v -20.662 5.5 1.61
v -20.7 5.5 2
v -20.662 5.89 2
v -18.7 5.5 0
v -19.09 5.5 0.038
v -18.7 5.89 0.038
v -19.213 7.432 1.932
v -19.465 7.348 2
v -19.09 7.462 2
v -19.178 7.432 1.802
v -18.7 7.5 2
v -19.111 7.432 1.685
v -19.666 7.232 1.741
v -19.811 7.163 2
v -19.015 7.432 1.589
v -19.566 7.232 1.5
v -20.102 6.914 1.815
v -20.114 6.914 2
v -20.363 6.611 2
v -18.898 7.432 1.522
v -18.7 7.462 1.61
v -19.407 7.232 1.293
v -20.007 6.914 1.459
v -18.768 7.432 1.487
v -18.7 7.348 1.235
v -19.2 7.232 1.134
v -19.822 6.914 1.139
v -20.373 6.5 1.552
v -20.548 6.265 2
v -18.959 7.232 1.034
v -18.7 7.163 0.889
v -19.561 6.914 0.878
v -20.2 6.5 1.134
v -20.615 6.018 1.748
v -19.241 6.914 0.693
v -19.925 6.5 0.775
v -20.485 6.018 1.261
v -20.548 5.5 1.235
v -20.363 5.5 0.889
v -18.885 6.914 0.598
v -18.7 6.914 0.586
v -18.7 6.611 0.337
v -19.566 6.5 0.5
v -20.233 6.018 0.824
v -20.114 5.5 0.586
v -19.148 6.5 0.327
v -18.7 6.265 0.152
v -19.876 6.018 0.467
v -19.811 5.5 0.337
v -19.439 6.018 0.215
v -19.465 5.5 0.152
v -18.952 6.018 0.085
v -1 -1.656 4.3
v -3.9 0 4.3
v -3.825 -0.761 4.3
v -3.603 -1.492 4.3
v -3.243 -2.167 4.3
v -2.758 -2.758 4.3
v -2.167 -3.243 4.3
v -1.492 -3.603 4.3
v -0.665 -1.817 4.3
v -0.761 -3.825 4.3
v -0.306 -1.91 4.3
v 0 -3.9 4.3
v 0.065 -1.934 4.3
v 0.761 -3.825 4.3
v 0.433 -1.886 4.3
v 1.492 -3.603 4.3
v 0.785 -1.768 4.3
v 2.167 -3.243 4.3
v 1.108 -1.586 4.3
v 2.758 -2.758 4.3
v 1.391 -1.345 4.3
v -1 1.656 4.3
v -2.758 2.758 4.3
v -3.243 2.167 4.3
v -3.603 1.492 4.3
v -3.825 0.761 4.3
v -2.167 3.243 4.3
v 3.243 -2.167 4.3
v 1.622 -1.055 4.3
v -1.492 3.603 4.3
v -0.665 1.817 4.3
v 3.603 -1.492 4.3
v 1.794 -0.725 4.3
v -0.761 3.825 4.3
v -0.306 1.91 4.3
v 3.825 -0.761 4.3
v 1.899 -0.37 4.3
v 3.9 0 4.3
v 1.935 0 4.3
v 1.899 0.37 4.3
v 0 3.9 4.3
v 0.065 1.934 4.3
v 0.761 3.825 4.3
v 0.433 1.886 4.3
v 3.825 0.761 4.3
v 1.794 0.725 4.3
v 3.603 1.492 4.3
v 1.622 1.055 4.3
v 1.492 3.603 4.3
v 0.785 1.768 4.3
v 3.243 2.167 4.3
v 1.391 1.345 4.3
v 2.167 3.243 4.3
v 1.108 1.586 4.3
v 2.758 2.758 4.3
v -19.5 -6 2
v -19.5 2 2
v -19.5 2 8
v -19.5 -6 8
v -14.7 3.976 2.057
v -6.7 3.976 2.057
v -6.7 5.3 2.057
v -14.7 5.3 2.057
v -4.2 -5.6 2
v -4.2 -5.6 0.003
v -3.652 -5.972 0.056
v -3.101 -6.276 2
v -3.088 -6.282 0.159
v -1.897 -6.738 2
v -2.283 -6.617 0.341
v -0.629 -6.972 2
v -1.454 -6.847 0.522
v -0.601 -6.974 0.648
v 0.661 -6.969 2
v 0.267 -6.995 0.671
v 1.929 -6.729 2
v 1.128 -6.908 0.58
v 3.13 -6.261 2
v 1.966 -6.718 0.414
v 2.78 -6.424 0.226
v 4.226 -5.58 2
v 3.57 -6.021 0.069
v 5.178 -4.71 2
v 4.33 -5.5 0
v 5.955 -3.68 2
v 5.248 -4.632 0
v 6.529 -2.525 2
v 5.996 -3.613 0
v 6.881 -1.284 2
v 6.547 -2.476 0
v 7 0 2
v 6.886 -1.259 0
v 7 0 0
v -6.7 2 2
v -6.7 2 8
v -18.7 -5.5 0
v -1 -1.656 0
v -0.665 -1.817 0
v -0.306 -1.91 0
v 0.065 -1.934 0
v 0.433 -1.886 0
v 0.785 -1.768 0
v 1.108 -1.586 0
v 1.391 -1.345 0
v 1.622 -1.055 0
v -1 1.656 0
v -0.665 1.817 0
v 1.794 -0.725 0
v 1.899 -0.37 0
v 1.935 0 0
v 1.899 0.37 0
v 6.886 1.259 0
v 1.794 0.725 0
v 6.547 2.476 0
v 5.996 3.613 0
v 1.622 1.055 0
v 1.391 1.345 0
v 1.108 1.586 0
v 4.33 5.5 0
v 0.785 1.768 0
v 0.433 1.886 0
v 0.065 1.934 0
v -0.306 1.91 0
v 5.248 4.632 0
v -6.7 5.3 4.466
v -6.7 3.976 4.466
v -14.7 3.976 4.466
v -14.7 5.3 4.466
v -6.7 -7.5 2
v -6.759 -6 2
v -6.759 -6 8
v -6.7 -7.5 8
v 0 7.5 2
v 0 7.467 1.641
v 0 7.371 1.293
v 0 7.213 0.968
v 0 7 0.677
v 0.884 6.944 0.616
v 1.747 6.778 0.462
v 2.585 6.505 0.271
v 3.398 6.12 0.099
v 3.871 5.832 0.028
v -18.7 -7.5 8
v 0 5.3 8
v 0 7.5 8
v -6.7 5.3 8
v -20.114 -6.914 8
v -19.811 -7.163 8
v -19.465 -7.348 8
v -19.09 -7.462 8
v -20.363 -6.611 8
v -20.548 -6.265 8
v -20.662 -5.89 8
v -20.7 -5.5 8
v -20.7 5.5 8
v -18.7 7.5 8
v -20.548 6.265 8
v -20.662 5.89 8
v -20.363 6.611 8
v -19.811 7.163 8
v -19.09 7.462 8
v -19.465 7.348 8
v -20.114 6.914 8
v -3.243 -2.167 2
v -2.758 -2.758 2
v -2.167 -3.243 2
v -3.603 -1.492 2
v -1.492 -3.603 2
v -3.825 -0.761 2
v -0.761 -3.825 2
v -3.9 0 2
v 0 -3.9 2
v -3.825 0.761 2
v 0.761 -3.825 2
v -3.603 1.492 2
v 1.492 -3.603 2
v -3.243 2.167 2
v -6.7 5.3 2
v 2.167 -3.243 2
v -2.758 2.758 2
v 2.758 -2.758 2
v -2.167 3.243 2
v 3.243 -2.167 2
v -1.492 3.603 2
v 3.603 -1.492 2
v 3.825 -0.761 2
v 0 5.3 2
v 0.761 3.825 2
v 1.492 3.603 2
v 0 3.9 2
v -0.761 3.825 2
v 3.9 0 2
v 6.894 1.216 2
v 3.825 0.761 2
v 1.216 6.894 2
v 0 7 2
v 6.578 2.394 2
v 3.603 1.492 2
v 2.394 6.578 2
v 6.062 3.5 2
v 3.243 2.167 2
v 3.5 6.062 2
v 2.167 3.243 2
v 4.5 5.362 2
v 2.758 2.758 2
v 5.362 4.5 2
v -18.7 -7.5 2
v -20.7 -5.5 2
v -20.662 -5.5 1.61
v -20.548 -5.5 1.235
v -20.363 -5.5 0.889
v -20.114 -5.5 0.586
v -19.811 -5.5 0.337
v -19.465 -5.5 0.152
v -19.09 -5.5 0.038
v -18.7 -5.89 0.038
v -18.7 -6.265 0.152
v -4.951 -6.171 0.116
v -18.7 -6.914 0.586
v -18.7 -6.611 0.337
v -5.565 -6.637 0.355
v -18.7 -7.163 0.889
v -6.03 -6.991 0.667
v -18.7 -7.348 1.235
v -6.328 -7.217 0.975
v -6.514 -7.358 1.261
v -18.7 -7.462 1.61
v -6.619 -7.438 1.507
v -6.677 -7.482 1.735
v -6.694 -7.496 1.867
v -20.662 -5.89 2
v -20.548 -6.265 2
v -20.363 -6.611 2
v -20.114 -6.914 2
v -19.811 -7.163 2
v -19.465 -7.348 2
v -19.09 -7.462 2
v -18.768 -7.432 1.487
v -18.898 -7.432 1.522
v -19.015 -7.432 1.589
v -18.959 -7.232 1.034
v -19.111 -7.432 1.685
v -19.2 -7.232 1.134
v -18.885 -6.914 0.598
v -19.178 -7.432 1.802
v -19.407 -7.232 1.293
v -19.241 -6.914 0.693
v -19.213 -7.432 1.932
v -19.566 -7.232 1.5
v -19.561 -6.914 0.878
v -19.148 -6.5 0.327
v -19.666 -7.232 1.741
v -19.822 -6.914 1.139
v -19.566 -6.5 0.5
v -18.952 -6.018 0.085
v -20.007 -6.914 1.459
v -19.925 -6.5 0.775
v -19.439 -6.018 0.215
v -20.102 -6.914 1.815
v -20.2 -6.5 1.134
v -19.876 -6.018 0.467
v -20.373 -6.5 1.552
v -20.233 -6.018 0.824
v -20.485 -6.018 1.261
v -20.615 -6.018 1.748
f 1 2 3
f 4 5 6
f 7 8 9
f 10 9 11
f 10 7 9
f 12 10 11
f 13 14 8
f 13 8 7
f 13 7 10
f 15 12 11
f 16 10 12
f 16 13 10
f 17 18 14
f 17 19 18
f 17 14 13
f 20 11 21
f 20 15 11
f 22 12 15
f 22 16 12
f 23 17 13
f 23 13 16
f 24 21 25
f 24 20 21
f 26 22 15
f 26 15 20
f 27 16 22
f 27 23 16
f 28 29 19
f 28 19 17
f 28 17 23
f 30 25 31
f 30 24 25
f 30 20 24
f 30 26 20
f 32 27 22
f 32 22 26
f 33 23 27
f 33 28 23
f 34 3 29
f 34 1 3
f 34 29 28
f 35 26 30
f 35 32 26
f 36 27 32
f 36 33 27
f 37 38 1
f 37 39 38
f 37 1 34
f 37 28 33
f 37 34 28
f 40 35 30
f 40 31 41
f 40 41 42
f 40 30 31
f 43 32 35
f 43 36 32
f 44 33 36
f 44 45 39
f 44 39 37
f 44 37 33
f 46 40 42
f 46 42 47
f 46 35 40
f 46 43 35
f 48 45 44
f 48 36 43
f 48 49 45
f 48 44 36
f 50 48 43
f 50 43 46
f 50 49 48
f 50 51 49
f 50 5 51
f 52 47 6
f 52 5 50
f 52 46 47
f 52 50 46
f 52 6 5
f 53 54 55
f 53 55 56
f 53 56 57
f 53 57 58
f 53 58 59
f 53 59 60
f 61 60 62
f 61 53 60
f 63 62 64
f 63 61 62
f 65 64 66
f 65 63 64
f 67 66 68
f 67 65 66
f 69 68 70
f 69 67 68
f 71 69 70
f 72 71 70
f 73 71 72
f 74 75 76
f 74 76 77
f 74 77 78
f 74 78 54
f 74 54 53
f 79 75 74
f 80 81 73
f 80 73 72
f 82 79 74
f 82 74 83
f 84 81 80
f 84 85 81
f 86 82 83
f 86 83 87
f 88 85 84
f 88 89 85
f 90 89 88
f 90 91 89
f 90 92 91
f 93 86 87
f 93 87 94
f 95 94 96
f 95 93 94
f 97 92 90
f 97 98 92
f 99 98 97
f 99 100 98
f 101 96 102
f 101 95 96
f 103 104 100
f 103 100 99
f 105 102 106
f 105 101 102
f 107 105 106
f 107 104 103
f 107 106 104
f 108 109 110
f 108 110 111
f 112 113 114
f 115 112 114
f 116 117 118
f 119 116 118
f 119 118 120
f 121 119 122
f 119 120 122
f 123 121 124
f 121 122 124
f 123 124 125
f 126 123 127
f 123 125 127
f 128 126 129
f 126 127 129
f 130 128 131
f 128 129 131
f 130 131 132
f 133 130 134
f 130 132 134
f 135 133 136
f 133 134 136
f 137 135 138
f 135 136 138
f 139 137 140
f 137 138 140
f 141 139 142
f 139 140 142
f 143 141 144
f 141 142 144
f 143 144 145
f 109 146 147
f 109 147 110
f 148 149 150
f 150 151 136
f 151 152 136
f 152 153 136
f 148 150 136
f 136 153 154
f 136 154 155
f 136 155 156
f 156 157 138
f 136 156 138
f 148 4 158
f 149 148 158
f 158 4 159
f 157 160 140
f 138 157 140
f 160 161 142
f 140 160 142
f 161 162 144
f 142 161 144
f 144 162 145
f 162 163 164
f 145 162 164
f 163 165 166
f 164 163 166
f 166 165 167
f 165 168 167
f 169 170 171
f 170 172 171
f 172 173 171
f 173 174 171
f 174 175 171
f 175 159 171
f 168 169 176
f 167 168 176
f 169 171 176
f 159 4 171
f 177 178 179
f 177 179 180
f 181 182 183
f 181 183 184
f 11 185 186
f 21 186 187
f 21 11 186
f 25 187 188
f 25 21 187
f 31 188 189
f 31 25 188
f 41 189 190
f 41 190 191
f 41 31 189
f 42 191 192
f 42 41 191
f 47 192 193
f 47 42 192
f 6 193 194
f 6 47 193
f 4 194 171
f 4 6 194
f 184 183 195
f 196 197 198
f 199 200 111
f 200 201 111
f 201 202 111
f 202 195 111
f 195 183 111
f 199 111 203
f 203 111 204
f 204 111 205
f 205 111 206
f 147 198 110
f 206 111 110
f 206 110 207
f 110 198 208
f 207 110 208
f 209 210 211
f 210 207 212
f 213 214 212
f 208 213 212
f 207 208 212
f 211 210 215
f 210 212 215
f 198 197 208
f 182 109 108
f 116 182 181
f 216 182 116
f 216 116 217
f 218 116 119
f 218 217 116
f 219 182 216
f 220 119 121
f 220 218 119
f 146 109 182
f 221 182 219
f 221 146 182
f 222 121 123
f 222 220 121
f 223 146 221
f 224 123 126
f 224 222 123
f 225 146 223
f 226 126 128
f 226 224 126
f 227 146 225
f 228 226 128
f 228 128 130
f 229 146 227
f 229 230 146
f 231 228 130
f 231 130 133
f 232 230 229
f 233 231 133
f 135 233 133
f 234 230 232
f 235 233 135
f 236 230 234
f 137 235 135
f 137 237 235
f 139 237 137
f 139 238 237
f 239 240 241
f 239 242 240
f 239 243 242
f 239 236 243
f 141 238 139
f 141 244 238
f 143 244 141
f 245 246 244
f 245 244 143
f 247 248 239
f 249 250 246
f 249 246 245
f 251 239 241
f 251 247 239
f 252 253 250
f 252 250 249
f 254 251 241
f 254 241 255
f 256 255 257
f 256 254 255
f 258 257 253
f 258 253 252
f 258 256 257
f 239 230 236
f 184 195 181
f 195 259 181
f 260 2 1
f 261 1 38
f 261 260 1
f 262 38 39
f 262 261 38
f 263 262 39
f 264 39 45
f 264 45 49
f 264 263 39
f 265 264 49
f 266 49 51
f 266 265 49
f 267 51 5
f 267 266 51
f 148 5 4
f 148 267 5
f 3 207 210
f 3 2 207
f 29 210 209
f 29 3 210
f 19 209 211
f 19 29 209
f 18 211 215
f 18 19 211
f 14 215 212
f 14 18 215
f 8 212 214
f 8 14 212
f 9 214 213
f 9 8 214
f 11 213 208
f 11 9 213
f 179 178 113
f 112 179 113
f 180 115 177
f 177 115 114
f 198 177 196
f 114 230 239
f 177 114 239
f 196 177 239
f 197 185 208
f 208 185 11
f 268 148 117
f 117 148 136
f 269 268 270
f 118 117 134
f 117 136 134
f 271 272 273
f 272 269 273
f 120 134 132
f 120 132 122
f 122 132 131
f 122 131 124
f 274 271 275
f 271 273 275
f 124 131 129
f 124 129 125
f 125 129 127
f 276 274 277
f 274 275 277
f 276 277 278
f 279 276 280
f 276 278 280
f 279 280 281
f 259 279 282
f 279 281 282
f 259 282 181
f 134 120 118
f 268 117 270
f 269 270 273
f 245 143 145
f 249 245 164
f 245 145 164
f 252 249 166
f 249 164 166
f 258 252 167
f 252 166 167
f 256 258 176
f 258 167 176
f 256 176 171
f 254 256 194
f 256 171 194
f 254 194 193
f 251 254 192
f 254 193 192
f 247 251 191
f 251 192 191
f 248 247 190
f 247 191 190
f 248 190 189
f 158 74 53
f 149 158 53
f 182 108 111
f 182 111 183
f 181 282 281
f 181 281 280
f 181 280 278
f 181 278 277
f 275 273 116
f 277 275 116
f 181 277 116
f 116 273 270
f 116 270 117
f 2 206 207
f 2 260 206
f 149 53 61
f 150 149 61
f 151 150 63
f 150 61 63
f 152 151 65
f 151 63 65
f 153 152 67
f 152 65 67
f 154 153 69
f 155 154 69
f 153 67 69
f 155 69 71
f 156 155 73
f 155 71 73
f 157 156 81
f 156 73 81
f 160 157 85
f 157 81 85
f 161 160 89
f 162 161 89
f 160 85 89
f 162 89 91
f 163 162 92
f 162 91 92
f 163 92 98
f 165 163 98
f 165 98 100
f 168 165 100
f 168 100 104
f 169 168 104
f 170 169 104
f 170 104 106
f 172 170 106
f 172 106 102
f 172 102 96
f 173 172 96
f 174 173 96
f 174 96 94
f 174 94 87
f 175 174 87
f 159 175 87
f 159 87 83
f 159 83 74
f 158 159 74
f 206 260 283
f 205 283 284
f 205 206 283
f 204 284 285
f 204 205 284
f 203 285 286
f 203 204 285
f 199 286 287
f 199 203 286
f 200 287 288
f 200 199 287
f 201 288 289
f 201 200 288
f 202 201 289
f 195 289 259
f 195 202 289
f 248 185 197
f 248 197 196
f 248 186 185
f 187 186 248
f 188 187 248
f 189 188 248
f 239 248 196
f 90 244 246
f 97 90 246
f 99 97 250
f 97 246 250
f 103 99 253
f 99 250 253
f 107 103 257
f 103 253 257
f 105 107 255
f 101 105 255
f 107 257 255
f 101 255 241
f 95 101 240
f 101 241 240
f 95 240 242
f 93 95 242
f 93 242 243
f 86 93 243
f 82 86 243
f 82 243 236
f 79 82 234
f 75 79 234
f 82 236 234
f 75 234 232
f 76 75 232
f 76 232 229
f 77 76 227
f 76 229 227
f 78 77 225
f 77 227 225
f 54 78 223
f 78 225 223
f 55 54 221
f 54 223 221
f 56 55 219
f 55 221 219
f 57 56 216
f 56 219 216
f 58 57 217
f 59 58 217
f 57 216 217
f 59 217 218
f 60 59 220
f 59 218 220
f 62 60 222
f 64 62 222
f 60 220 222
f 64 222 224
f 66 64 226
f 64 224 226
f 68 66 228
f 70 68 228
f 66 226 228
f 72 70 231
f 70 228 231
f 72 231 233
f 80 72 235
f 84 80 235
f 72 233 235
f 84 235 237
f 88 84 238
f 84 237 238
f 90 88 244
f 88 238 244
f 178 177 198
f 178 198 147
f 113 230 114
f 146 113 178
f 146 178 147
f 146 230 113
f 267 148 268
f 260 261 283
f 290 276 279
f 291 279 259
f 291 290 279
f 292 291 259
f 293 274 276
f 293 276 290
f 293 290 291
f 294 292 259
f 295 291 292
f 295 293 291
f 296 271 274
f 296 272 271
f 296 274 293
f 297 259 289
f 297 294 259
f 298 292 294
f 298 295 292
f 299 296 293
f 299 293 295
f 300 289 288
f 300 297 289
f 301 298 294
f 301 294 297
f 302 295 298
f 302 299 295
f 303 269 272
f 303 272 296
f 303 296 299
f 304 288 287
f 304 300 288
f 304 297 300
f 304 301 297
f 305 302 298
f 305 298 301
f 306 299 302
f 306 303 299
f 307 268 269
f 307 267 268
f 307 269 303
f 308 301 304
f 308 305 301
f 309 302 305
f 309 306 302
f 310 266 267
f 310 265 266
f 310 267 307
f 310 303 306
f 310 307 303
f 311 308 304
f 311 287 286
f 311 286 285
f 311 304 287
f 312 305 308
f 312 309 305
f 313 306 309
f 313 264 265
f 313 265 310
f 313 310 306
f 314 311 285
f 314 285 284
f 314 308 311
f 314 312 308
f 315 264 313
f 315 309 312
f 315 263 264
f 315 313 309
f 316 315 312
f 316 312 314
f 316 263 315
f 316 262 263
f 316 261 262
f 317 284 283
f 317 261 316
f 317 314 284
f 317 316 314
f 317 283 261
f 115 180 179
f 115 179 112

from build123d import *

# Parameters (mm, degrees)
BOSS_EXTRUDE1_DEPTH = 2
BOSS_EXTRUDE2_DEPTH = 6
SKETCH24_R          = 3.9
BOSS_EXTRUDE5_DEPTH = 2.3
SKETCH30_W          = 2.408612022
SKETCH30_H          = 1.324178481
CUT_EXTRUDE12_DEPTH = 8
FILLET2_R           = 2
CUT_EXTRUDE11_DEPTH = 10


with BuildPart() as part:
    # Sketch2 → Boss-Extrude1 (new body)
    with BuildSketch(Plane.XY):
        with BuildLine():
            Line((-2.5, 7.5), (-20.7, 7.5))
            Line((-20.7, 7.5), (-20.7, -7.5))
            Line((-20.7, -7.5), (-6.7, -7.5))
            Line((-6.7, -7.5), (-4.2, -5.6))
            ThreePointArc((-4.2, -5.6), (3.130495168, -6.260990337), (7, 0))
            ThreePointArc((7, 0), (4.949747468, 4.949747468), (0, 7))
            Line((0, 7), (0, 7.5))
            Line((0, 7.5), (-2.5, 7.5))
        make_face()
    extrude(amount=BOSS_EXTRUDE1_DEPTH)

    # Sketch4 → Boss-Extrude2 (add)
    with BuildSketch(Plane.XY.offset(2)):
        Polygon((-20.7, -7.5), (-20.7, 7.5), (-0.7, 7.5), (0, 7.5), (0, 5.3), (-0.7, 5.3), (-6.7, 5.3), (-6.7, 2), (-19.5, 2), (-19.5, -6), (-6.759079174, -6), (-6.7, -7.5), (-19.292624541, -7.5), align=None)
    extrude(amount=BOSS_EXTRUDE2_DEPTH)

    # Sketch24 → Boss-Extrude5 (add)
    with BuildSketch(Plane.XY.offset(2)):
        Circle(SKETCH24_R)
    extrude(amount=BOSS_EXTRUDE5_DEPTH)

    # Sketch30 → Cut-Extrude12 (cut)
    with BuildSketch(Plane(origin=(-6.7, 0, 0), x_dir=(0, 0, -1), z_dir=(1, 0, 0))):
        with Locations((-3.261593395, 4.63791076)):
            Rectangle(SKETCH30_W, SKETCH30_H)
    extrude(amount=-CUT_EXTRUDE12_DEPTH, mode=Mode.SUBTRACT)

    # Fillet2
    fillet2_edges = [part.edges().sort_by_distance(p)[0] for p in [
        (-20.7, 0, 0),
        (-20.7, 7.5, 4),
        (-13.7, -7.5, 0),
        (-10.35, 7.5, 0),
        (-20.7, -7.5, 4),
    ]]
    fillet(fillet2_edges, radius=FILLET2_R)

    # Sketch28 → Cut-Extrude11 (cut)
    with BuildSketch(Plane.XY.offset(4.3)):
        with BuildLine():
            Line((-1, 1.656278148), (-1, -1.656278148))
            ThreePointArc((-1, -1.656278148), (1.934749933, 0), (-1, 1.656278148))
        make_face()
    extrude(amount=-CUT_EXTRUDE11_DEPTH, mode=Mode.SUBTRACT)


solid = part.part
